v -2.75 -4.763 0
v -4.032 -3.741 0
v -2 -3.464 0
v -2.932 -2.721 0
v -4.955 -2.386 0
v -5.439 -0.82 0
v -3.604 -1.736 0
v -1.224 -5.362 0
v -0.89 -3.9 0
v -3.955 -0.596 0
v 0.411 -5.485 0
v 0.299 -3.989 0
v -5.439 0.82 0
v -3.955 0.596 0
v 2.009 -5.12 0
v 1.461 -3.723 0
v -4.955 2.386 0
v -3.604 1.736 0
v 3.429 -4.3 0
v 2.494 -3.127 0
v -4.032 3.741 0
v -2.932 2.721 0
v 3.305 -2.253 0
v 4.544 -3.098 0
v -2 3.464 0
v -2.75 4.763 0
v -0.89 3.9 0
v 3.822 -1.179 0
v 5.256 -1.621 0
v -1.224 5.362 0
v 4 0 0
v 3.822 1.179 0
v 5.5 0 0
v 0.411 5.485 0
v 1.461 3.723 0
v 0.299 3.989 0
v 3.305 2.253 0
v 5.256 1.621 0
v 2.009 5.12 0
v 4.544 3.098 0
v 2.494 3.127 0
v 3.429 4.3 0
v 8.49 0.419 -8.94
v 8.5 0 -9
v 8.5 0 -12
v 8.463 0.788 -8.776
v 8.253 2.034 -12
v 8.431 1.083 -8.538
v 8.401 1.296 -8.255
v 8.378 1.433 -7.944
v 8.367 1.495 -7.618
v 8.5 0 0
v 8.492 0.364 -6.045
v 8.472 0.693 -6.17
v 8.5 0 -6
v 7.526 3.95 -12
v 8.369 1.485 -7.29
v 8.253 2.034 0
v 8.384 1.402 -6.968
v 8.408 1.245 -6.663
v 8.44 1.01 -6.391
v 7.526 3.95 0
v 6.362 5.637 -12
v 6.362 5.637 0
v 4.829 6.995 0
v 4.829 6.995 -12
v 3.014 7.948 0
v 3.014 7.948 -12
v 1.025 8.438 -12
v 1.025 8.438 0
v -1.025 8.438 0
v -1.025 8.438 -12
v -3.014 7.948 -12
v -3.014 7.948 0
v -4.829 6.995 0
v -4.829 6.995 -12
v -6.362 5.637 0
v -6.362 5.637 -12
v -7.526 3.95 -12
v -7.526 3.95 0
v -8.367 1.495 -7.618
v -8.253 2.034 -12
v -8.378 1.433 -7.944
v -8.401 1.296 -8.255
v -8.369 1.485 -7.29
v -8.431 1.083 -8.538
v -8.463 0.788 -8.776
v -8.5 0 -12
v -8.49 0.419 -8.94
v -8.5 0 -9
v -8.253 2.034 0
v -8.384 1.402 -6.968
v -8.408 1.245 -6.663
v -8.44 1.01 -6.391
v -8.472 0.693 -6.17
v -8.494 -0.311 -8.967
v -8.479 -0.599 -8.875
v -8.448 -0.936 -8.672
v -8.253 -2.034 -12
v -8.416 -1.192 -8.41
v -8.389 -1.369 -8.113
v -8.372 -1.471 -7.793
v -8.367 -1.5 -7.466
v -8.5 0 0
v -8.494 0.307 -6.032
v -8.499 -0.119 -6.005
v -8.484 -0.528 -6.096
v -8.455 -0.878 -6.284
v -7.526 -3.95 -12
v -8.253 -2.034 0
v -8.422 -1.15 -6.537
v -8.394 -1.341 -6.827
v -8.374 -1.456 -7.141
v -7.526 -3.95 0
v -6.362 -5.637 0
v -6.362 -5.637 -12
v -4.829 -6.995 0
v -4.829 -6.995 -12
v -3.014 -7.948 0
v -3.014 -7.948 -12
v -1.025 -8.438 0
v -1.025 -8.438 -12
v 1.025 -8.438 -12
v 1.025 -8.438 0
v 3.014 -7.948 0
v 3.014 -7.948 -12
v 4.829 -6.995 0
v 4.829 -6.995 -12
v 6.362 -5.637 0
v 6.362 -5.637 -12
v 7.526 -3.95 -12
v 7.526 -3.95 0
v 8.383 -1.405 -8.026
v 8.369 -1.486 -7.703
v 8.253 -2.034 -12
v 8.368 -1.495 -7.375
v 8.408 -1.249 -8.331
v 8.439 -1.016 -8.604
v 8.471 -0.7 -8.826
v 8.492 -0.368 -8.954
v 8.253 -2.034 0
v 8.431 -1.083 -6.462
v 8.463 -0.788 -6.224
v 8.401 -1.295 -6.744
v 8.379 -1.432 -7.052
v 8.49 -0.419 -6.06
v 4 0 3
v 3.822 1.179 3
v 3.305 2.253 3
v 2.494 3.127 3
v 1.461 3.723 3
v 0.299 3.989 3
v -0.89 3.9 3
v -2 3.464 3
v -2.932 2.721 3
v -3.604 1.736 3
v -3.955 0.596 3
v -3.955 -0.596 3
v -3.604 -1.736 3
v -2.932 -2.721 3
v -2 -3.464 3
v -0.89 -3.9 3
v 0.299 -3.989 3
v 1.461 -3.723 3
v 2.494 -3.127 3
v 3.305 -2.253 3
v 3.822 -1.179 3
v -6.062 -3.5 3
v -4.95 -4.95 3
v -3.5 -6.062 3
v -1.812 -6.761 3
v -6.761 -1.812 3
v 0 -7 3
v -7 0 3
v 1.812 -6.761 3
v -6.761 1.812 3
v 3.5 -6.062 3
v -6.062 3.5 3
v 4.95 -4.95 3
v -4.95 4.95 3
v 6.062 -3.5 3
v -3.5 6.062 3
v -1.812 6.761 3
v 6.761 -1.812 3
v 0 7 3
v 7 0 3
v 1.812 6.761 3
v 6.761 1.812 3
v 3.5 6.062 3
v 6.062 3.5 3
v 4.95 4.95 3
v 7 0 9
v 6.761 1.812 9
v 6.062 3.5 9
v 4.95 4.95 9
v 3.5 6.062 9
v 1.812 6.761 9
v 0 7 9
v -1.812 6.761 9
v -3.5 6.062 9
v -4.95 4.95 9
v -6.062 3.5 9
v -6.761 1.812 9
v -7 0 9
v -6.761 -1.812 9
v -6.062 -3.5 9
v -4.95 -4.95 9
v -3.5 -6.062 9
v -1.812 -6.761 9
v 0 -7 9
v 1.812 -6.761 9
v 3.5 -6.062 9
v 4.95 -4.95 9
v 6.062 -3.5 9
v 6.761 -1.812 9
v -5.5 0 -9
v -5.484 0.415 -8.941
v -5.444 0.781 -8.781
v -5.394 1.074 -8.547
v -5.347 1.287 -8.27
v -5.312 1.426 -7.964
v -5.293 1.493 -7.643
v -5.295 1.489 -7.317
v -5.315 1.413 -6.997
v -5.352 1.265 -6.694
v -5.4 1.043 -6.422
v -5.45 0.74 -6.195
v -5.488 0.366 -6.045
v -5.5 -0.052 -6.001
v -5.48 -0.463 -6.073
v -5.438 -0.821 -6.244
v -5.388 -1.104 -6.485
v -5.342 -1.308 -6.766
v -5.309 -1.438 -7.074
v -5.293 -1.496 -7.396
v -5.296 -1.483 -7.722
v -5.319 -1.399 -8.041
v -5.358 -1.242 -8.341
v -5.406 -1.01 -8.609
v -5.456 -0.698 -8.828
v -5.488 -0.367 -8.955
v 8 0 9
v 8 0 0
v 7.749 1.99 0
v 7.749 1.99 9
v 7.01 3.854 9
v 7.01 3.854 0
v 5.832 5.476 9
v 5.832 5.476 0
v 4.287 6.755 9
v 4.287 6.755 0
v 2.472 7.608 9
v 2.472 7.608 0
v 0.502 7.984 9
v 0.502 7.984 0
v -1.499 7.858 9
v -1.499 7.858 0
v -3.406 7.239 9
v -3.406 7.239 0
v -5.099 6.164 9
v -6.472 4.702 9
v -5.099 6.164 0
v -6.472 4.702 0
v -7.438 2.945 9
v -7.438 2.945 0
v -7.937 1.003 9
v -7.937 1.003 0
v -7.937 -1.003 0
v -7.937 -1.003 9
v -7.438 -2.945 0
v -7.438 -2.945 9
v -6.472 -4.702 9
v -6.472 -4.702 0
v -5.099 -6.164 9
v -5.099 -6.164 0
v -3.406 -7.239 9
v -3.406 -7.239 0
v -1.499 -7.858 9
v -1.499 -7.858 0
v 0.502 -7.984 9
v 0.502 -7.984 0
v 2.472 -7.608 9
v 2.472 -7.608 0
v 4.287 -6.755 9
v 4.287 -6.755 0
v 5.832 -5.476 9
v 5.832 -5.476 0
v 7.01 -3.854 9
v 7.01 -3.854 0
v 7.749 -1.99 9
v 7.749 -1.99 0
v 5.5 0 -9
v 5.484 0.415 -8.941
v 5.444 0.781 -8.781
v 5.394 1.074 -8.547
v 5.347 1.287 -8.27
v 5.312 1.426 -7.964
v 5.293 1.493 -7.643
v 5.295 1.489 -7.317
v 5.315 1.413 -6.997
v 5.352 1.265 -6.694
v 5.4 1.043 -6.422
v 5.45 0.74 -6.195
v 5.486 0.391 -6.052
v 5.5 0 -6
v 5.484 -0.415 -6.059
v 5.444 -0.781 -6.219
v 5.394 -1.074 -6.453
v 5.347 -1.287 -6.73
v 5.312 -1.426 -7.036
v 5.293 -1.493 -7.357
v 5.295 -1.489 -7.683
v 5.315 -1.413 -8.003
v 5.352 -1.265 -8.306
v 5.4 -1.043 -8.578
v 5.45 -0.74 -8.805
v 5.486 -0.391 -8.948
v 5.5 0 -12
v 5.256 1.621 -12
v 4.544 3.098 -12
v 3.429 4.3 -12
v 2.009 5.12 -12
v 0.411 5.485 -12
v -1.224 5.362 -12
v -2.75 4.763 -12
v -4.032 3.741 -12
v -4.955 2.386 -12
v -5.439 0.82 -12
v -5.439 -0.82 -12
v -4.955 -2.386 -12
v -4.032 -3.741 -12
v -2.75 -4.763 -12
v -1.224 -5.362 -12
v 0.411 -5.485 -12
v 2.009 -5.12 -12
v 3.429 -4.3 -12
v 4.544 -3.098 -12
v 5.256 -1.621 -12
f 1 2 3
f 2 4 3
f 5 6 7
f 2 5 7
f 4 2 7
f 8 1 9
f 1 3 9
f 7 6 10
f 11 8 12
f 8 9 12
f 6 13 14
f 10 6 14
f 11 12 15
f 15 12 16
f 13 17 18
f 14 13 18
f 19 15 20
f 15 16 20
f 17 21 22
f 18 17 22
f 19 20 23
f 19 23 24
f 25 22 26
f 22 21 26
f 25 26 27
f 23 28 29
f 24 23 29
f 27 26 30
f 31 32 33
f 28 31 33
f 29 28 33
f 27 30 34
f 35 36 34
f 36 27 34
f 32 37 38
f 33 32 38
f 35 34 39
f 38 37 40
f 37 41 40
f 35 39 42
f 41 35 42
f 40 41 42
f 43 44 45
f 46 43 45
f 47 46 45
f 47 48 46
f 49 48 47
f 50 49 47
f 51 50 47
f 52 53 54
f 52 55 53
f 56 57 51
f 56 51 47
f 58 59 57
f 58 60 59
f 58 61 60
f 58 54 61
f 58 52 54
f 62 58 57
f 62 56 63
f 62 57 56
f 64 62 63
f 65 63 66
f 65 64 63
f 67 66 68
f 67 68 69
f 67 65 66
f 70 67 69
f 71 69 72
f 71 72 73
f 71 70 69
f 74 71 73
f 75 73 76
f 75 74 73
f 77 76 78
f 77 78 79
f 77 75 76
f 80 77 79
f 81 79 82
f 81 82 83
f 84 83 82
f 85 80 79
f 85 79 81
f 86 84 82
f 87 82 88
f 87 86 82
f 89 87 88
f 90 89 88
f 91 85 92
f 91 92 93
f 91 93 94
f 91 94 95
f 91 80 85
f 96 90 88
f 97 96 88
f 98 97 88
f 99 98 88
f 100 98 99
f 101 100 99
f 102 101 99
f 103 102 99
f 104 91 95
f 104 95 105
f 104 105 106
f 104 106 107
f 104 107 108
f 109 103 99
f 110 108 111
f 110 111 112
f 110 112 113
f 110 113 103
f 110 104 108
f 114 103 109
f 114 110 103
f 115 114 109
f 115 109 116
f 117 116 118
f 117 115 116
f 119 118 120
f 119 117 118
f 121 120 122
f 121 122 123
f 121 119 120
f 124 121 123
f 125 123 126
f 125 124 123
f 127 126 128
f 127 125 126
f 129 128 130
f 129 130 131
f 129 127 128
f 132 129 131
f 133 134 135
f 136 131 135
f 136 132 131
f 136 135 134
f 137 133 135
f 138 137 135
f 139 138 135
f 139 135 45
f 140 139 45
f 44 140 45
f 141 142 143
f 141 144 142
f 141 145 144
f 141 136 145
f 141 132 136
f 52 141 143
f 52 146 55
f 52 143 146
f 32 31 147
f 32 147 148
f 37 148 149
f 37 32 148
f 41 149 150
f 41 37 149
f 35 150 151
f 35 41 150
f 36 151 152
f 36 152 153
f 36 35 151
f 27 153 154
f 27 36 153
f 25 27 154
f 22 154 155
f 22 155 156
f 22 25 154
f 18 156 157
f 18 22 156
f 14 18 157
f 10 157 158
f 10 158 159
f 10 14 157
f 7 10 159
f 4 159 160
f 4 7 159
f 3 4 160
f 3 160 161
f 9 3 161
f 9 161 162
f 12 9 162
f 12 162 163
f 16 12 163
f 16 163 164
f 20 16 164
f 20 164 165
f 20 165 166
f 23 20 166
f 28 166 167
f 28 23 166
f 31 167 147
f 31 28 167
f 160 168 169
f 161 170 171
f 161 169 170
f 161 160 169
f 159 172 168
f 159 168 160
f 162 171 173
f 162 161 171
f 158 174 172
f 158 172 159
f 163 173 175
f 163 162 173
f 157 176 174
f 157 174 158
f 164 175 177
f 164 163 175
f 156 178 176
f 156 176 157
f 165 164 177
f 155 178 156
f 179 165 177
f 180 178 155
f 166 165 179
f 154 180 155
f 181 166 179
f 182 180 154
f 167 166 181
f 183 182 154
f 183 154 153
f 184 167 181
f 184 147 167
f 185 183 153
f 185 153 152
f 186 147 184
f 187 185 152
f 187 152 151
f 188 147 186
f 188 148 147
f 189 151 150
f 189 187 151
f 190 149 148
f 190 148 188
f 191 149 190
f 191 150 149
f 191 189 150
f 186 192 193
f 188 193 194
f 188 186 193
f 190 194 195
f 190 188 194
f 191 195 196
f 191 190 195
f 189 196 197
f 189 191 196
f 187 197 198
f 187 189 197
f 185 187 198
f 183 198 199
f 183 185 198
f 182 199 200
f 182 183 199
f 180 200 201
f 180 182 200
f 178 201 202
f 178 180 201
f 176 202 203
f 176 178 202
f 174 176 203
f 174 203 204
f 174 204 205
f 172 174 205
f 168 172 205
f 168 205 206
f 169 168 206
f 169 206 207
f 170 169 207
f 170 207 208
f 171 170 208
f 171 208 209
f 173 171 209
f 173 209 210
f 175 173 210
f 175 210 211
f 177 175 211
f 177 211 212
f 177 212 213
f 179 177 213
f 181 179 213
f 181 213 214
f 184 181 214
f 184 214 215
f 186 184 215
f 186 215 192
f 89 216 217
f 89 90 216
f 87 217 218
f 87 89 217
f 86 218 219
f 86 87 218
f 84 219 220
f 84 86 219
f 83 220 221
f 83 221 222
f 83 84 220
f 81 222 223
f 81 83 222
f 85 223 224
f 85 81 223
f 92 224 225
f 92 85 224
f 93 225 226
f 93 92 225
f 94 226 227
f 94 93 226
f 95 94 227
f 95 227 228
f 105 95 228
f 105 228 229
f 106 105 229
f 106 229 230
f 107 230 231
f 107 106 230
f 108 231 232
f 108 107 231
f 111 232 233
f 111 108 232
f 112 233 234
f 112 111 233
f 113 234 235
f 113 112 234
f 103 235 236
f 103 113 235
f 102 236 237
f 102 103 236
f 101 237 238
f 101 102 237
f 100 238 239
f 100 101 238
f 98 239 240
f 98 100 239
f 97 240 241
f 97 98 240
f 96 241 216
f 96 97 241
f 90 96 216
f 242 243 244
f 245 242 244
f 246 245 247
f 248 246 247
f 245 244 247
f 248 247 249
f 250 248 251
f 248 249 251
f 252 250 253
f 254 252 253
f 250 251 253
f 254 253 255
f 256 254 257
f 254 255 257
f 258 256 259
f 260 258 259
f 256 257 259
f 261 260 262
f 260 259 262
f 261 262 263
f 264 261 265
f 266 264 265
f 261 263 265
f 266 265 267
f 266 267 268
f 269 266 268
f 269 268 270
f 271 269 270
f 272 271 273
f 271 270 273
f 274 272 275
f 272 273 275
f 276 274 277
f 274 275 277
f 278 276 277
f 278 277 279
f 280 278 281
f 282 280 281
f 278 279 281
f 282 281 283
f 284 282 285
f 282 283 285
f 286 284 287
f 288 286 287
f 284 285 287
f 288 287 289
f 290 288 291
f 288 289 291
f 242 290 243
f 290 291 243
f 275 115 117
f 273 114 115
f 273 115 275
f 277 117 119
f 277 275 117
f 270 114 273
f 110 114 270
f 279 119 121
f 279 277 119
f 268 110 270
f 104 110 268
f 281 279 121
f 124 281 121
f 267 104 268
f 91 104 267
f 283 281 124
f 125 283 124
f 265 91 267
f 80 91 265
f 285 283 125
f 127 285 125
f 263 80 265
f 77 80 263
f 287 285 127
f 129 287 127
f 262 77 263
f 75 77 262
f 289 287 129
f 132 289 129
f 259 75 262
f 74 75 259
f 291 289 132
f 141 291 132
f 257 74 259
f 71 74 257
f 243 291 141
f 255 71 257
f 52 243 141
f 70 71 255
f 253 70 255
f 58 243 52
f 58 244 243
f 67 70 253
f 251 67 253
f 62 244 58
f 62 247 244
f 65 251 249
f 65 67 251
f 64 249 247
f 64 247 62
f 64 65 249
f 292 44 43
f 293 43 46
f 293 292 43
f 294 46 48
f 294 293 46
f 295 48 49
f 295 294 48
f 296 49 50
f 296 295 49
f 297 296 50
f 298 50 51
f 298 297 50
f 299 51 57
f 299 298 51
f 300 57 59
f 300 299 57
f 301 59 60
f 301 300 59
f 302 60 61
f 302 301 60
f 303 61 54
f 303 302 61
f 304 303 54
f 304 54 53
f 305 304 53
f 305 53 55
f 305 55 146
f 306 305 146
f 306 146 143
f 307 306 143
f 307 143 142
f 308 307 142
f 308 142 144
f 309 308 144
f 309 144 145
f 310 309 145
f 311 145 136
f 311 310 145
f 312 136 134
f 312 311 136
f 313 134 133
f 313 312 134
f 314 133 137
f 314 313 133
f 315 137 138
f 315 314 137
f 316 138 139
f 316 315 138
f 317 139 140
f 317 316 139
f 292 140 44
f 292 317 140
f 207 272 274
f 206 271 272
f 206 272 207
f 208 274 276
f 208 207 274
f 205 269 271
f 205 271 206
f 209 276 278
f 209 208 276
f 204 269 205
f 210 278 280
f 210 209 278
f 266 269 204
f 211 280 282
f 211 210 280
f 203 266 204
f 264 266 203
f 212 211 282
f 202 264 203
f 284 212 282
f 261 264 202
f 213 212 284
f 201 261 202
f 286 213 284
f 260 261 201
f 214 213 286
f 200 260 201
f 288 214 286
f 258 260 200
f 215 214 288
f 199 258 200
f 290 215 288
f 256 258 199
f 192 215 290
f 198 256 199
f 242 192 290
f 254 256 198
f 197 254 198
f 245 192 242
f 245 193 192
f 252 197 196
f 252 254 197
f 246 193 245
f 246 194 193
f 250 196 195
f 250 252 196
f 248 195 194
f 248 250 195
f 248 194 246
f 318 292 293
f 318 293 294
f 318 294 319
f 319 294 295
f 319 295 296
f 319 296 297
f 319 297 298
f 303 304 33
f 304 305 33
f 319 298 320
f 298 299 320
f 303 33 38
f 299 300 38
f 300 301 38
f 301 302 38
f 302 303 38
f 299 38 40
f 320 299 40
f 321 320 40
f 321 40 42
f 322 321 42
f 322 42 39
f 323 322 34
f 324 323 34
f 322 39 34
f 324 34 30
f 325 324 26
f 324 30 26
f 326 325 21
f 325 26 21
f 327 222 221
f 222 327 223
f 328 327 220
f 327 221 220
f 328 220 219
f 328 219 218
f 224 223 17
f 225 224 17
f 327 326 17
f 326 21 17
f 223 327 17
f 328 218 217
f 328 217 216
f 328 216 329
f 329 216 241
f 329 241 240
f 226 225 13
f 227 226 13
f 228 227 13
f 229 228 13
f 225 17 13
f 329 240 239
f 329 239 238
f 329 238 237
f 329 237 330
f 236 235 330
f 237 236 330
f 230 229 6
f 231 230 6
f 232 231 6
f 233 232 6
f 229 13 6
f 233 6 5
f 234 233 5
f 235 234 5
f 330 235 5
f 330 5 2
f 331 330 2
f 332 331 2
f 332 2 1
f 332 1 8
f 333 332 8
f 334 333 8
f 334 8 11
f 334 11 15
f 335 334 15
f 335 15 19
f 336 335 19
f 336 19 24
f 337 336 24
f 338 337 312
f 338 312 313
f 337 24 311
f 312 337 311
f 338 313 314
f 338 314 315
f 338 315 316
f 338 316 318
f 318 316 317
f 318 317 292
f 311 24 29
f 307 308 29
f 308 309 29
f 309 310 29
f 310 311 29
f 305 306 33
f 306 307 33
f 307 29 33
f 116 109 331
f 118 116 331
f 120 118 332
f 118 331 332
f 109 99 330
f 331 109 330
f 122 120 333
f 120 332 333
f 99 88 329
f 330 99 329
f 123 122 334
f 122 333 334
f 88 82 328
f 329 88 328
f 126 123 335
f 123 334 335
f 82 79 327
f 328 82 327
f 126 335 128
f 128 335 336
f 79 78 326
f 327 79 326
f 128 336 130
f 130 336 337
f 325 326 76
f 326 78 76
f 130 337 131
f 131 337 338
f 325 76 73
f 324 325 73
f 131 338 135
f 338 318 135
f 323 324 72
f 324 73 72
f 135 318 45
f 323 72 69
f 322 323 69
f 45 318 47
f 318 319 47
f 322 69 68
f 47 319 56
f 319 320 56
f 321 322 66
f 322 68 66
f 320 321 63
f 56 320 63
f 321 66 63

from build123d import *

# Parameters (mm, degrees)
SKETCH1_R                = 7.5
SKETCH1_R_2              = 4
BOSS_EXTRUDE1_DEPTH      = 3
SKETCH2_R                = 8.5
SKETCH2_R_2              = 5.5
BOSS_EXTRUDE2_DEPTH      = 12
CUT_EXTRUDE1_DEPTH       = 17.985287751
CUT_EXTRUDE1_DEPTH_BACK  = 17.985287751
SKETCH4_R                = 1.5
BOSS_EXTRUDE4_DEPTH      = 6
BOSS_EXTRUDE4_DEPTH_BACK = 3
SKETCH5_R                = 8
SKETCH5_R_2              = 7


with BuildPart() as part:
    # Sketch1 → Boss-Extrude1 (new body)
    with BuildSketch(Plane.XY):
        Circle(SKETCH1_R)
        Circle(SKETCH1_R_2, mode=Mode.SUBTRACT)
    extrude(amount=BOSS_EXTRUDE1_DEPTH)

    # Sketch2 → Boss-Extrude2 (add)
    with BuildSketch(Plane.XY):
        Circle(SKETCH2_R)
        Circle(SKETCH2_R_2, mode=Mode.SUBTRACT)
    extrude(amount=-BOSS_EXTRUDE2_DEPTH)

    # Sketch4 → Cut-Extrude1 (cut, two sides: drawn at the far end of the back side and taken through both)
    with BuildSketch(Plane(origin=(0, 0, 0), x_dir=(0, 0, -1), z_dir=(1, 0, 0)).offset(-CUT_EXTRUDE1_DEPTH_BACK)):
        with Locations((7.5, 0)):
            Circle(SKETCH4_R)
    extrude(amount=CUT_EXTRUDE1_DEPTH + CUT_EXTRUDE1_DEPTH_BACK, mode=Mode.SUBTRACT)

    # Sketch5 → Boss-Extrude4 (add, two sides: drawn at the far end of the back side and taken through both)
    with BuildSketch(Plane.XY.offset(3).offset(-BOSS_EXTRUDE4_DEPTH_BACK)):
        Circle(SKETCH5_R)
        Circle(SKETCH5_R_2, mode=Mode.SUBTRACT)
    extrude(amount=BOSS_EXTRUDE4_DEPTH + BOSS_EXTRUDE4_DEPTH_BACK)


solid = part.part
